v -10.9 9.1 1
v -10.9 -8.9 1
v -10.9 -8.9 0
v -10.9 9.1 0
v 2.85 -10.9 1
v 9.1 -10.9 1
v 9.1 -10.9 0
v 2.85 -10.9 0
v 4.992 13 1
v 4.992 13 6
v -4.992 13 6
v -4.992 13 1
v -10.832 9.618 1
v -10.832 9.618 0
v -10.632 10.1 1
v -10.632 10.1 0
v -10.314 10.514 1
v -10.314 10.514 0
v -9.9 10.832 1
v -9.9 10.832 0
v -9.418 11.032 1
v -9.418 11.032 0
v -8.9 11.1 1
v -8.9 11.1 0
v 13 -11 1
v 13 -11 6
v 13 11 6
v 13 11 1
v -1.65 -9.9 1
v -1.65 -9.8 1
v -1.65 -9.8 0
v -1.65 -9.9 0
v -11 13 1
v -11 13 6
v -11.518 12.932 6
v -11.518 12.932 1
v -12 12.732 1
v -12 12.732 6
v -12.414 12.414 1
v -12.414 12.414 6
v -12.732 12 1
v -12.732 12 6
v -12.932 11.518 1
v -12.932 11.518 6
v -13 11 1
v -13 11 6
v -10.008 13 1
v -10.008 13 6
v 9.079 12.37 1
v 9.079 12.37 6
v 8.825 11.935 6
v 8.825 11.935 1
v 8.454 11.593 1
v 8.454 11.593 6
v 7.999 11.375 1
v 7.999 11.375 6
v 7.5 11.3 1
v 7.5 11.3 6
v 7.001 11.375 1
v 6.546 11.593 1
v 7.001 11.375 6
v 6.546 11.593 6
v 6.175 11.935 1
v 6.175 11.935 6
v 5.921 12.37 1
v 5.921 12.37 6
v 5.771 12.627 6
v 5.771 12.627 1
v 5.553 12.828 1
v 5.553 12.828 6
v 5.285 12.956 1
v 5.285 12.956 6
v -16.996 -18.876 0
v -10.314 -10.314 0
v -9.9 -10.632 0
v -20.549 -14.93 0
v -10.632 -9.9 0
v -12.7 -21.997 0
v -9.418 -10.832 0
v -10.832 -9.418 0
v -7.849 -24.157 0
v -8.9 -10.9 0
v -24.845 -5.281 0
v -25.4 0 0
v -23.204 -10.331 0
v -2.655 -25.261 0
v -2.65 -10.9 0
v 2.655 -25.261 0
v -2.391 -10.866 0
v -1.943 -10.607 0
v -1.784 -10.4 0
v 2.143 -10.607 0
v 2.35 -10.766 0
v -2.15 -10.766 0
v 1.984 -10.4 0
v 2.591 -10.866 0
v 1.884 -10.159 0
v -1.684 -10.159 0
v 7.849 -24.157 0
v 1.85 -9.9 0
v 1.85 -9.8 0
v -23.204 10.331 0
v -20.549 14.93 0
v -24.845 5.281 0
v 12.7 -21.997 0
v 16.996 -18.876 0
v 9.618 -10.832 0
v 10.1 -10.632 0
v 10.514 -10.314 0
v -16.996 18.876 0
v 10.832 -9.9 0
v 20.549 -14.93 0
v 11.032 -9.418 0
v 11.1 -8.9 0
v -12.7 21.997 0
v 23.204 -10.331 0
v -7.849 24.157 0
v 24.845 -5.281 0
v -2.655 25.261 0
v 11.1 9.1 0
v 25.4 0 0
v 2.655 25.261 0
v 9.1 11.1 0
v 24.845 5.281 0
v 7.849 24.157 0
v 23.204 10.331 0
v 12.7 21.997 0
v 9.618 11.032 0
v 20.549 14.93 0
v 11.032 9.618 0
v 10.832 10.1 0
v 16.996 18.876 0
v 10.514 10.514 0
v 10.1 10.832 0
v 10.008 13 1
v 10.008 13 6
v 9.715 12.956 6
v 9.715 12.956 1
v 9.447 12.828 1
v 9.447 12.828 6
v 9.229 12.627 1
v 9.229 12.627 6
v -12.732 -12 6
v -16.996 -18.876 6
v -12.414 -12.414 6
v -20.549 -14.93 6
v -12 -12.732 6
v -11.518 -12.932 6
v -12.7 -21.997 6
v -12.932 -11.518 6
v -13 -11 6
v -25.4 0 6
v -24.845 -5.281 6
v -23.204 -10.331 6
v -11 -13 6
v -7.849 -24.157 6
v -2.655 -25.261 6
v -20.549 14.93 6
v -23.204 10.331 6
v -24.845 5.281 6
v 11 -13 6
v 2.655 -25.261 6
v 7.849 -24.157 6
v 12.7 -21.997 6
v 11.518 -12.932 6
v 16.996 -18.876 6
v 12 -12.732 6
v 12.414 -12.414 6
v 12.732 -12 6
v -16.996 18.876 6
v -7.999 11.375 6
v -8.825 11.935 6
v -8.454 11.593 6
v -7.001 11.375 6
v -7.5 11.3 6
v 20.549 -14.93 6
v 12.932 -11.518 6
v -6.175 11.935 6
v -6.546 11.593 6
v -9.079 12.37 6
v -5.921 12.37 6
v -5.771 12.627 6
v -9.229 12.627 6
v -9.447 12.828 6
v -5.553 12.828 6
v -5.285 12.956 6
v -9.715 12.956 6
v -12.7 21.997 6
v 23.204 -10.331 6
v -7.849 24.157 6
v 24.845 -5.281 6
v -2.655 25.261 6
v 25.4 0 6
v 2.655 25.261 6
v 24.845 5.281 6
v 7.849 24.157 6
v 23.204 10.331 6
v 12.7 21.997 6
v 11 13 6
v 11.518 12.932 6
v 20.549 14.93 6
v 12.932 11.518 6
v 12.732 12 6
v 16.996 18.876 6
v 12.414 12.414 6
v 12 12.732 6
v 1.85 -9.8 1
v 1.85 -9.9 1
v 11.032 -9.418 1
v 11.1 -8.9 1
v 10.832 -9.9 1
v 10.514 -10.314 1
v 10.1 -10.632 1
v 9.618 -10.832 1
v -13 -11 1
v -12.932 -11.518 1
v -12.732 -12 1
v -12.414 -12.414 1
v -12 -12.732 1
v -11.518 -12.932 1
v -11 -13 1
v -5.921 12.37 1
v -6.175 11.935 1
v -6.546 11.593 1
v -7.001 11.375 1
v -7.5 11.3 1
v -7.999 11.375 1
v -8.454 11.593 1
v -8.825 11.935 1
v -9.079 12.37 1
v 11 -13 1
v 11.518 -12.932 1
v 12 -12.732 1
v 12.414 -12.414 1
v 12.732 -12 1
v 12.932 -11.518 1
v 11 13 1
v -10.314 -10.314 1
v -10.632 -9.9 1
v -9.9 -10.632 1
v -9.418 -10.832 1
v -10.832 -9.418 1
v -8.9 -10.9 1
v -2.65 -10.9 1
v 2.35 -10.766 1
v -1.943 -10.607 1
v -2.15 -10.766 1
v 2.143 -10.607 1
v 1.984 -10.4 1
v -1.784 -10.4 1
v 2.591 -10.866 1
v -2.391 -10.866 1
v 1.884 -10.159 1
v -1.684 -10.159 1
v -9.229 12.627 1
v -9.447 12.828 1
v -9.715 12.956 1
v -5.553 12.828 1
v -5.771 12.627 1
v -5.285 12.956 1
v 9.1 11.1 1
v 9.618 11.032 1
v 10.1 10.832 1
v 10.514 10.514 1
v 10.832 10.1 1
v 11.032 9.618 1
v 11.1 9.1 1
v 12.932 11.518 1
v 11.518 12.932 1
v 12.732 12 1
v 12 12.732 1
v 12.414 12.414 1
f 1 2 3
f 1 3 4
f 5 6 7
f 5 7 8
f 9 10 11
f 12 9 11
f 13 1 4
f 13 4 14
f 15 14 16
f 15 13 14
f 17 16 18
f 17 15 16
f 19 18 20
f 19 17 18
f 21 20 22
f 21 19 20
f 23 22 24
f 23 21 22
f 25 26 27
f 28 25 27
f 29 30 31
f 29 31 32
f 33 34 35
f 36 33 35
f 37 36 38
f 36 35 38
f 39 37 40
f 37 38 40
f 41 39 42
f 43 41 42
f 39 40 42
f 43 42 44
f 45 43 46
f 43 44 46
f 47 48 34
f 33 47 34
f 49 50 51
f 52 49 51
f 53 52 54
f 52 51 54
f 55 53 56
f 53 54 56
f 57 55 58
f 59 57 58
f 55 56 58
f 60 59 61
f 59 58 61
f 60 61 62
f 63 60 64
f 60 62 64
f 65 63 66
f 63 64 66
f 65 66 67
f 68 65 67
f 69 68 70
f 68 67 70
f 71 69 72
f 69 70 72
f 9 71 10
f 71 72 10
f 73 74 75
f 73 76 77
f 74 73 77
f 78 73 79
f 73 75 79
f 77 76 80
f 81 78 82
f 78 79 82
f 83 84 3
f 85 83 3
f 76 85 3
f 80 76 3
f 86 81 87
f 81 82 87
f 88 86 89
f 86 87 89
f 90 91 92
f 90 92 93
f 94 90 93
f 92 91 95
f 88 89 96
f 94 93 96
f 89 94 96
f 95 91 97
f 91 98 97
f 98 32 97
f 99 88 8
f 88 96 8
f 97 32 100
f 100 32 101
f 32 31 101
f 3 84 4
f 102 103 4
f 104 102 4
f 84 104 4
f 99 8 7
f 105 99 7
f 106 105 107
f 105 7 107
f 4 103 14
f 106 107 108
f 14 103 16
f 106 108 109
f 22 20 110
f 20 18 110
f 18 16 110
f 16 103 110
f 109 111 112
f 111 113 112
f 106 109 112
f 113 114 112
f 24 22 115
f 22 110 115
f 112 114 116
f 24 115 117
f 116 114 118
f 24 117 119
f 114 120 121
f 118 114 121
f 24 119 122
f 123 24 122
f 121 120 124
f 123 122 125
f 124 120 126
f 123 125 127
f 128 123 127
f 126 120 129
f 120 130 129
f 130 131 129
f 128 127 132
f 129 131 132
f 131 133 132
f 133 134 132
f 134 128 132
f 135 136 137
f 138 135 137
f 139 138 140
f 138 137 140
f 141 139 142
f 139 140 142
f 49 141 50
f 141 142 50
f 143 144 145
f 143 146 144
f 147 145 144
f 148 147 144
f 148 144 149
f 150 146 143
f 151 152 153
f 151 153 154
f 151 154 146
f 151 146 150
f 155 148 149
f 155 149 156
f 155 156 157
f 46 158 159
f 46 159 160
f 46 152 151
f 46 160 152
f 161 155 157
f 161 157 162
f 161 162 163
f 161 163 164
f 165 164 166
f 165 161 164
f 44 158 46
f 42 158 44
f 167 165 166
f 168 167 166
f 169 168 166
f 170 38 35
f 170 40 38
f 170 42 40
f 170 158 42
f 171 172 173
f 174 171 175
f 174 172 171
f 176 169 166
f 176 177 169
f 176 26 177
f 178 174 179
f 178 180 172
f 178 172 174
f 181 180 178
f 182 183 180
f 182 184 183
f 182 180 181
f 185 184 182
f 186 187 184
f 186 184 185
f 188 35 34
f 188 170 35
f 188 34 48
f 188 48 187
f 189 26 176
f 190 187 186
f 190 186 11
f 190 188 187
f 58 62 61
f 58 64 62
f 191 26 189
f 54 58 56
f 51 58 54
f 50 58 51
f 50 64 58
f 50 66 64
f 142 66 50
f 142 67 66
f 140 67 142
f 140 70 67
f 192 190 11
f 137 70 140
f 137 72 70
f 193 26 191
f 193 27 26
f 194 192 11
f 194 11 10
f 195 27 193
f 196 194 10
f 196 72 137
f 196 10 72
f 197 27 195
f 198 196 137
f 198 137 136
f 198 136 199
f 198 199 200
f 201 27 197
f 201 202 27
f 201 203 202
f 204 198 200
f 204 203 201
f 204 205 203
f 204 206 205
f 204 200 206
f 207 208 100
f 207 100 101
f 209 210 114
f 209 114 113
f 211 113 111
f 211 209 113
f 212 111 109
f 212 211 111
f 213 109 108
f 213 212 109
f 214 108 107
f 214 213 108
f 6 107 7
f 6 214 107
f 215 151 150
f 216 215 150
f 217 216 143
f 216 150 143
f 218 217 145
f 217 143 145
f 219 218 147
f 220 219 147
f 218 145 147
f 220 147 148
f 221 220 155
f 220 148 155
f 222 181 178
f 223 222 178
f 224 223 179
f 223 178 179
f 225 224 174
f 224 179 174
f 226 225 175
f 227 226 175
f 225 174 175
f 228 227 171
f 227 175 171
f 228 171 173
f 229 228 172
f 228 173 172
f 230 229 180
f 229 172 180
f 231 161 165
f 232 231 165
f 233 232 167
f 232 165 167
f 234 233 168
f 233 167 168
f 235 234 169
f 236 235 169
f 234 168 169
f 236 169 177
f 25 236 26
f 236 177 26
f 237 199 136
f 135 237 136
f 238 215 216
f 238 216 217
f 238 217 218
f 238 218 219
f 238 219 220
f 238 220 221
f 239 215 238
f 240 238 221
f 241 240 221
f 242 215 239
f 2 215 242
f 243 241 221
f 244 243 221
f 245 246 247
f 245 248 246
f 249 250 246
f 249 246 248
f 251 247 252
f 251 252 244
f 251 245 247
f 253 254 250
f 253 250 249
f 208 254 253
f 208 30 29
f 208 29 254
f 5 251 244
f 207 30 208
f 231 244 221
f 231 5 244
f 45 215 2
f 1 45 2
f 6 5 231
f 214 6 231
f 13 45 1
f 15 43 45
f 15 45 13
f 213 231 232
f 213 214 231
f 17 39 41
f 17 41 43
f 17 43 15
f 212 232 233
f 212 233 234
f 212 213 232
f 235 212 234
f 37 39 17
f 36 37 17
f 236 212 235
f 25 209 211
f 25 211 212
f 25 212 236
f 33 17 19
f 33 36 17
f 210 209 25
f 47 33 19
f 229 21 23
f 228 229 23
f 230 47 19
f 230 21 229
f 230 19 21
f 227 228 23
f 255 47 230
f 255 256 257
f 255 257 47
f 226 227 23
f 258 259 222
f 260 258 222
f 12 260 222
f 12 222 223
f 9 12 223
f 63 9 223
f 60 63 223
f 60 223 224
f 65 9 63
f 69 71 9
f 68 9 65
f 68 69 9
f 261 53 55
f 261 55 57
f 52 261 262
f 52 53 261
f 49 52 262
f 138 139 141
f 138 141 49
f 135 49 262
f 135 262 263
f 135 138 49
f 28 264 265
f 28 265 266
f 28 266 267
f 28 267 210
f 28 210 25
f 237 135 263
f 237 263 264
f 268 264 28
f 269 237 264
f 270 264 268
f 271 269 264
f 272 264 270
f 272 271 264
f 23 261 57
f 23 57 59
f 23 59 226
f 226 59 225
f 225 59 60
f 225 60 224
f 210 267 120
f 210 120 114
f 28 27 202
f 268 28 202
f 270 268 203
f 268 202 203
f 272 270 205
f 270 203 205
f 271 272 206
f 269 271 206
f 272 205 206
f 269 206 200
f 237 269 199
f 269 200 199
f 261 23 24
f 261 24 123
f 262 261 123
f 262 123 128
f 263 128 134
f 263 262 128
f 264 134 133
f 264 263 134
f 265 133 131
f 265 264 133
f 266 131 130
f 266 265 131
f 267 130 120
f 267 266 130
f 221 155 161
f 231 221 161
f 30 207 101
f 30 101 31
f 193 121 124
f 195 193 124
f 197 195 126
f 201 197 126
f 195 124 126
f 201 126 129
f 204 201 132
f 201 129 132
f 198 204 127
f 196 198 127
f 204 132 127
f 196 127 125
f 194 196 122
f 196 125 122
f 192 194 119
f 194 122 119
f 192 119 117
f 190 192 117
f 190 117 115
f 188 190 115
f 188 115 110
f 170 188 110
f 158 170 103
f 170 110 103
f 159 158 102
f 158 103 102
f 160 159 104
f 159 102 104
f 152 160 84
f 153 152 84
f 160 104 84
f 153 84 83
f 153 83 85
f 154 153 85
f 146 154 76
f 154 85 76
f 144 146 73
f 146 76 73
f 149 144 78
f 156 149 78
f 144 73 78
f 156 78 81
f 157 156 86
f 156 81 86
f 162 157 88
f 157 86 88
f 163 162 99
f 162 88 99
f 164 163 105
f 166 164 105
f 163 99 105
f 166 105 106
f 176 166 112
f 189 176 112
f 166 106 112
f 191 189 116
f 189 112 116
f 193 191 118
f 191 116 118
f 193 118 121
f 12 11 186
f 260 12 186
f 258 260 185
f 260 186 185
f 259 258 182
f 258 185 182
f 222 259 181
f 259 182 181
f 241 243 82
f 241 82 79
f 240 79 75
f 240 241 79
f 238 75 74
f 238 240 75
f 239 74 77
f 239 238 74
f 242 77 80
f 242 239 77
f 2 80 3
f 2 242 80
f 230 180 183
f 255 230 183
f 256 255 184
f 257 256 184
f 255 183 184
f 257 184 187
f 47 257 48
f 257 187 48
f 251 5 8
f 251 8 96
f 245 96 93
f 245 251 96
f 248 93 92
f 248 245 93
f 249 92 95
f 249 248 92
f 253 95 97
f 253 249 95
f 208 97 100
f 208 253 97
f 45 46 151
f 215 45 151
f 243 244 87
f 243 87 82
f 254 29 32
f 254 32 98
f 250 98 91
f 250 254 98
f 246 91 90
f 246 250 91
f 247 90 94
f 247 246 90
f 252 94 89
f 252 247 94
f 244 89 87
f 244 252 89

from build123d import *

# Parameters (mm, degrees)
SKETCH1_R           = 25.4
BOSS_EXTRUDE1_DEPTH = 6
CUT_EXTRUDE2_DEPTH  = 5
CUT_EXTRUDE3_DEPTH  = 2


with BuildPart() as part:
    # Sketch1 → Boss-Extrude1 (new body)
    with BuildSketch(Plane.XY):
        Circle(SKETCH1_R)
    extrude(amount=BOSS_EXTRUDE1_DEPTH)

    # Sketch2 → Cut-Extrude2 (cut)
    with BuildSketch(Plane.XY.offset(6)):
        with BuildLine():
            Line((-11, -13), (11, -13))
            ThreePointArc((11, -13), (12.414213562, -12.414213562), (13, -11))
            Line((13, -11), (13, 11))
            ThreePointArc((13, 11), (12.414213562, 12.414213562), (11, 13))
            Line((11, 13), (10.007987241, 13))
            ThreePointArc((10.007987241, 13), (9.446903633, 12.827759135), (9.079103078, 12.37037037))
            ThreePointArc((9.079103078, 12.37037037), (7.5, 11.3), (5.920896922, 12.37037037))
            ThreePointArc((5.920896922, 12.37037037), (5.553096367, 12.827759135), (4.992012759, 13))
            Line((4.992012759, 13), (-4.992012759, 13))
            ThreePointArc((-4.992012759, 13), (-5.553096367, 12.827759135), (-5.920896922, 12.37037037))
            ThreePointArc((-5.920896922, 12.37037037), (-7.5, 11.3), (-9.079103078, 12.37037037))
            ThreePointArc((-9.079103078, 12.37037037), (-9.446903633, 12.827759135), (-10.007987241, 13))
            Line((-10.007987241, 13), (-11, 13))
            ThreePointArc((-11, 13), (-12.414213562, 12.414213562), (-13, 11))
            Line((-13, 11), (-13, -11))
            ThreePointArc((-13, -11), (-12.414213562, -12.414213562), (-11, -13))
        make_face()
    extrude(amount=-CUT_EXTRUDE2_DEPTH, mode=Mode.SUBTRACT)

    # Sketch3 → Cut-Extrude3 (cut, through all)
    with BuildSketch(Plane.XY.offset(1)):
        with BuildLine():
            Line((-10.9, -8.9), (-10.9, 9.1))
            ThreePointArc((-10.9, 9.1), (-10.314213562, 10.514213562), (-8.9, 11.1))
            Line((-8.9, 11.1), (9.1, 11.1))
            ThreePointArc((9.1, 11.1), (10.514213562, 10.514213562), (11.1, 9.1))
            Line((11.1, 9.1), (11.1, -8.9))
            ThreePointArc((11.1, -8.9), (10.514213562, -10.314213562), (9.1, -10.9))
            Line((9.1, -10.9), (2.85, -10.9))
            ThreePointArc((2.85, -10.9), (2.142893219, -10.607106781), (1.85, -9.9))
            Line((1.85, -9.9), (1.85, -9.8))
            Line((1.85, -9.8), (-1.65, -9.8))
            Line((-1.65, -9.8), (-1.65, -9.9))
            ThreePointArc((-1.65, -9.9), (-1.942893219, -10.607106781), (-2.65, -10.9))
            Line((-2.65, -10.9), (-8.9, -10.9))
            ThreePointArc((-8.9, -10.9), (-10.314213562, -10.314213562), (-10.9, -8.9))
        make_face()
    extrude(amount=-CUT_EXTRUDE3_DEPTH, mode=Mode.SUBTRACT)


solid = part.part
